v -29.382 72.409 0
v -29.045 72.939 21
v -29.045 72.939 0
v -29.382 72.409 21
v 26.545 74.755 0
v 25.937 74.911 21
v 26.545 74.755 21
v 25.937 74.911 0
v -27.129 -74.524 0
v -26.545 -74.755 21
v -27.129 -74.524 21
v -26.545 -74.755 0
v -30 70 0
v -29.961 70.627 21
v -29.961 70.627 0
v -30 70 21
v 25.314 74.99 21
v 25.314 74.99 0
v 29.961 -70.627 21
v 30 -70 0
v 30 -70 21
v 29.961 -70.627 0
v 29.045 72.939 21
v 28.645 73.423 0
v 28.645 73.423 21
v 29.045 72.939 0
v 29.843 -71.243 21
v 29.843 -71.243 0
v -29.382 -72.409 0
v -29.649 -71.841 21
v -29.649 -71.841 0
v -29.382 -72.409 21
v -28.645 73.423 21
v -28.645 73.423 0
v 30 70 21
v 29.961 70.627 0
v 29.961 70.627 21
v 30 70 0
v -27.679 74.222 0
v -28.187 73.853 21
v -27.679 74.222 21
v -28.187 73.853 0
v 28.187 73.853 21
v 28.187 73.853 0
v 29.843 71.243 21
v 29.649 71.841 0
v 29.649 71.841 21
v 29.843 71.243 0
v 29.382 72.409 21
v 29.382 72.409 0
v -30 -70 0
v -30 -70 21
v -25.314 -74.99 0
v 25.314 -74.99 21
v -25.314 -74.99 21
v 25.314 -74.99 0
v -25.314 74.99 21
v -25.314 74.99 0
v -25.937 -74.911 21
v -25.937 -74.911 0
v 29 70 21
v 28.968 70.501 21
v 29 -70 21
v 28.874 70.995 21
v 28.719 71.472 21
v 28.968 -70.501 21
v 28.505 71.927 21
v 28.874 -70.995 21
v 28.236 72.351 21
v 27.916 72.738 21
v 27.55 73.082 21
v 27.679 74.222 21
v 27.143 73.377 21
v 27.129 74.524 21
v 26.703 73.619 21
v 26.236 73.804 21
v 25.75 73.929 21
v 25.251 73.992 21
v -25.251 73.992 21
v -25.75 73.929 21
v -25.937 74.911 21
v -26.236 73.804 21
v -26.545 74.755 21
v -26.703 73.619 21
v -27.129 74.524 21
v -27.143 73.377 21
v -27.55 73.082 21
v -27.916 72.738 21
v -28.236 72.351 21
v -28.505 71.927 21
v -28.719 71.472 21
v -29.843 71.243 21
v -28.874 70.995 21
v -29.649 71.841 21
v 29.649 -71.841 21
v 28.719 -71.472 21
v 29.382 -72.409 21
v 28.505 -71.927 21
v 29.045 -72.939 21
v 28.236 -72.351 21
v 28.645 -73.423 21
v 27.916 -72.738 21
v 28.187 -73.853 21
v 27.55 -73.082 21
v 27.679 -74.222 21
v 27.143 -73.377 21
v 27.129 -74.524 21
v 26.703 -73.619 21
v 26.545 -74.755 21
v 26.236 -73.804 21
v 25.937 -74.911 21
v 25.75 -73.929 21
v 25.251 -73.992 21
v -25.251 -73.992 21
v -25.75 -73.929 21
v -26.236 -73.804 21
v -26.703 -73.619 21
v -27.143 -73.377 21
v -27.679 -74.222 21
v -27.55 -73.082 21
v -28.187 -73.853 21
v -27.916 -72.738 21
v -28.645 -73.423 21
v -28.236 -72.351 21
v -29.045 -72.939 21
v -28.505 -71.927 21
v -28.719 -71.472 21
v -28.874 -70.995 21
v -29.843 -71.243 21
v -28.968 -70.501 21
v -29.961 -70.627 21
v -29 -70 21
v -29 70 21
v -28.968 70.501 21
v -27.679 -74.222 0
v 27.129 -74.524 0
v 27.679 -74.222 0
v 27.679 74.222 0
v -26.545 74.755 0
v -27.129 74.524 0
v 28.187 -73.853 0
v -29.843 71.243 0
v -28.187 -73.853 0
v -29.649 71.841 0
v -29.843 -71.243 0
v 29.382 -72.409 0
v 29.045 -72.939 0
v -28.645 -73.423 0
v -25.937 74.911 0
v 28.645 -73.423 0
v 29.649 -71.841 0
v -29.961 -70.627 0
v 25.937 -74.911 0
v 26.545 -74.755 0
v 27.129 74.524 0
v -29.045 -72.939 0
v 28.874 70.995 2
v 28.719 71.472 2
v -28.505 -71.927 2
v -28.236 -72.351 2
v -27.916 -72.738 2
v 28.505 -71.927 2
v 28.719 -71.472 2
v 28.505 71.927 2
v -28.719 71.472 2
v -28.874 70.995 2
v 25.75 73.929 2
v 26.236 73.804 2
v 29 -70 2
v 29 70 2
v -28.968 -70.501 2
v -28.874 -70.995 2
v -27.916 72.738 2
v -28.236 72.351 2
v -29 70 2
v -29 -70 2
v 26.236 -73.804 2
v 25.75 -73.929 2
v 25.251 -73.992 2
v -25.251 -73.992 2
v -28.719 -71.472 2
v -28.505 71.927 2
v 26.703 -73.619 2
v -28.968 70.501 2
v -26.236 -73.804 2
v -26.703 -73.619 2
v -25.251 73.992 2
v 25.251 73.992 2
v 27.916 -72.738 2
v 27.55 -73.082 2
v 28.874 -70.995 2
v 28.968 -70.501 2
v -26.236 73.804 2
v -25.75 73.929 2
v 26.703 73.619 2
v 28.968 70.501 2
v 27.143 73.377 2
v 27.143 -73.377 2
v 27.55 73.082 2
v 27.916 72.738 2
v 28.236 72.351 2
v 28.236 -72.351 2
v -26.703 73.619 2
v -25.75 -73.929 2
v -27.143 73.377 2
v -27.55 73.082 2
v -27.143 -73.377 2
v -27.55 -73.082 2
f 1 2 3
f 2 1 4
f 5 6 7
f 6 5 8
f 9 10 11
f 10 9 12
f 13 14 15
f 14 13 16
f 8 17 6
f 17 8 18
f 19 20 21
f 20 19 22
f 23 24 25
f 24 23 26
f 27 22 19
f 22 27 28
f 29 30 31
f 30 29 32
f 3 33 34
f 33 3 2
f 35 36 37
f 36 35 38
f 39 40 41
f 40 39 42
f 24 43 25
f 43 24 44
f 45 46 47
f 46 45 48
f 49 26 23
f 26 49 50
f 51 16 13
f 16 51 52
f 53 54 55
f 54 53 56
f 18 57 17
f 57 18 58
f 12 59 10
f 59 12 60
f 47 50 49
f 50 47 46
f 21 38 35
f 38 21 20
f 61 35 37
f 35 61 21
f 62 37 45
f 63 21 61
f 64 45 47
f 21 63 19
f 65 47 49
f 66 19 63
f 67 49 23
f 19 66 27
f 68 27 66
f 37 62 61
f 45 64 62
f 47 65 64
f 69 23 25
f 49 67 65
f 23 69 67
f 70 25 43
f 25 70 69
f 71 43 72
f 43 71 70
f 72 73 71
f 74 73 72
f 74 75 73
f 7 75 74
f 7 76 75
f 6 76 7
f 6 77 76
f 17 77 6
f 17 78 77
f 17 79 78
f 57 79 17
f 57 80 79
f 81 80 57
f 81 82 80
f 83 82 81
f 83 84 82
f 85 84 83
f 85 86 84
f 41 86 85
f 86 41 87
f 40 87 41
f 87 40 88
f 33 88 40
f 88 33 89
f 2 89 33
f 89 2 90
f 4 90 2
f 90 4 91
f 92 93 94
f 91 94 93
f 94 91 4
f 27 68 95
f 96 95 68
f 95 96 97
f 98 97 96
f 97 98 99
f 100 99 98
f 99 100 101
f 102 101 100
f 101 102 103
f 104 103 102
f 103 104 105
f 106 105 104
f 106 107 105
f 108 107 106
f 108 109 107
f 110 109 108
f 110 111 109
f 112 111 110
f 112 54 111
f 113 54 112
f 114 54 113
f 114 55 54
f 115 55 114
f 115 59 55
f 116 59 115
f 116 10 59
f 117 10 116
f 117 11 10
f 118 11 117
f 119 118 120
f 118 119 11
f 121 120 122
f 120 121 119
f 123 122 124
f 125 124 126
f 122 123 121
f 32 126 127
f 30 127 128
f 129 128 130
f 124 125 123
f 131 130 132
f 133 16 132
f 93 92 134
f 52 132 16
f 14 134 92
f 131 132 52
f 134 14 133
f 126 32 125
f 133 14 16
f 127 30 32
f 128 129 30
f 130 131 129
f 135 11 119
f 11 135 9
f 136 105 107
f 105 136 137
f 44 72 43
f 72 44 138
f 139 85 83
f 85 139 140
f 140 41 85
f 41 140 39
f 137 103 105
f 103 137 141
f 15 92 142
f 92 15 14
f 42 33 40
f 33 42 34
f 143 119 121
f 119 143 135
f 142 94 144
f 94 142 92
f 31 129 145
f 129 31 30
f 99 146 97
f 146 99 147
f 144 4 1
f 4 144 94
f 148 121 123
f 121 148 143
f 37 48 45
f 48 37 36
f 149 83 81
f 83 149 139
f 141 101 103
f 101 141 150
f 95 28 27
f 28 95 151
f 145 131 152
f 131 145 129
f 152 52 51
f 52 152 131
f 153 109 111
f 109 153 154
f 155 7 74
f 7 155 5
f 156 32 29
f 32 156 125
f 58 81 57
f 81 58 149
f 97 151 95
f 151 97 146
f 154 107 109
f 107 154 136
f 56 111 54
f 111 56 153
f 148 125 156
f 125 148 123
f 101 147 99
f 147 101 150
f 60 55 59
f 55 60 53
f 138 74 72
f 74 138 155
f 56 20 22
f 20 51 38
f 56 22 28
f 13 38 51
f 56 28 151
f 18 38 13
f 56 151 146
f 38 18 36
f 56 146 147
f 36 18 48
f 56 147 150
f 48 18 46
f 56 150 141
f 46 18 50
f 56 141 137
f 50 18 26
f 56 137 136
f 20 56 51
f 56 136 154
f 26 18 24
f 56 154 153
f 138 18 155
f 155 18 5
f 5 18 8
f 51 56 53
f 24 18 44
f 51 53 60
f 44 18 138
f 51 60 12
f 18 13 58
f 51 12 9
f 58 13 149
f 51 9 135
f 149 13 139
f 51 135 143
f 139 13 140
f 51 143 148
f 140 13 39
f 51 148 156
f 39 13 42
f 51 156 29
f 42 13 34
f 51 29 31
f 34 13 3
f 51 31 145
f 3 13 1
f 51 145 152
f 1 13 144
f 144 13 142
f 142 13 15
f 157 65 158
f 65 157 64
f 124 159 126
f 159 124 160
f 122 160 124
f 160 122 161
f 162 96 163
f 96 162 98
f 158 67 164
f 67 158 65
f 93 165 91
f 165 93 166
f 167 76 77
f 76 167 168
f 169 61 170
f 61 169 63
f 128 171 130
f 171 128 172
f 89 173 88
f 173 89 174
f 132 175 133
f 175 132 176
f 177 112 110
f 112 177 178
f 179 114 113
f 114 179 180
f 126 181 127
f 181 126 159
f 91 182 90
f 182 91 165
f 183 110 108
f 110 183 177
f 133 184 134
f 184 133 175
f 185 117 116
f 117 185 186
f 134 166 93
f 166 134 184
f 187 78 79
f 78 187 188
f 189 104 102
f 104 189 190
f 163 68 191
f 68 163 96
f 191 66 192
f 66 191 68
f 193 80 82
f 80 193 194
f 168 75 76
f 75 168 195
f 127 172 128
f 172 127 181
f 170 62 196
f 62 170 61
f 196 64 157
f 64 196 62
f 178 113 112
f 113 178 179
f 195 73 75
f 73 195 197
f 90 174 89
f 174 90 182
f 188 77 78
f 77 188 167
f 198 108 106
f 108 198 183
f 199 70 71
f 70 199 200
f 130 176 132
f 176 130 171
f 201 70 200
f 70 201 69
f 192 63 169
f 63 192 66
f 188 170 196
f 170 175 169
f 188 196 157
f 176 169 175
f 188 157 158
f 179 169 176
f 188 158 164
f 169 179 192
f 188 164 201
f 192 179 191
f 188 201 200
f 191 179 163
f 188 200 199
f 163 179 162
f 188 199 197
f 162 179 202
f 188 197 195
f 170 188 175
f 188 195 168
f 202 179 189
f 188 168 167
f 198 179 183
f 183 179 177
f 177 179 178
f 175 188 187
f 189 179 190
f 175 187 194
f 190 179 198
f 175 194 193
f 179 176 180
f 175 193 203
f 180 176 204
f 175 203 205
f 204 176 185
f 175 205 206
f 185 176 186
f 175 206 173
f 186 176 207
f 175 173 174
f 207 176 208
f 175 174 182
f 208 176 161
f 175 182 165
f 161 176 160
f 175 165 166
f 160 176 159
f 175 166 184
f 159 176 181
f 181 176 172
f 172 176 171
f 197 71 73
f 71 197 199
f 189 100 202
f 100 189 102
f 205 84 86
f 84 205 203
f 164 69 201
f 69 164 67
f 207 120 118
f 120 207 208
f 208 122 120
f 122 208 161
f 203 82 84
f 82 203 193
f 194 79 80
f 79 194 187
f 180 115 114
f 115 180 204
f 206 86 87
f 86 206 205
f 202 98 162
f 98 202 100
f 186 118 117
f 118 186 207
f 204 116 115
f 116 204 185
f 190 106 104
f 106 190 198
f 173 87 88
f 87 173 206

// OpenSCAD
$fn = 50;


difference() {
	union() {
		hull() {
			translate(v = [-25.0000000000, 70.0000000000, 0]) {
				cylinder(h = 21, r = 5);
			}
			translate(v = [25.0000000000, 70.0000000000, 0]) {
				cylinder(h = 21, r = 5);
			}
			translate(v = [-25.0000000000, -70.0000000000, 0]) {
				cylinder(h = 21, r = 5);
			}
			translate(v = [25.0000000000, -70.0000000000, 0]) {
				cylinder(h = 21, r = 5);
			}
		}
	}
	union() {
		translate(v = [0, 0, 2]) {
			hull() {
				translate(v = [-25.0000000000, 70.0000000000, 0]) {
					cylinder(h = 19, r = 4);
				}
				translate(v = [25.0000000000, 70.0000000000, 0]) {
					cylinder(h = 19, r = 4);
				}
				translate(v = [-25.0000000000, -70.0000000000, 0]) {
					cylinder(h = 19, r = 4);
				}
				translate(v = [25.0000000000, -70.0000000000, 0]) {
					cylinder(h = 19, r = 4);
				}
			}
		}
	}
}
